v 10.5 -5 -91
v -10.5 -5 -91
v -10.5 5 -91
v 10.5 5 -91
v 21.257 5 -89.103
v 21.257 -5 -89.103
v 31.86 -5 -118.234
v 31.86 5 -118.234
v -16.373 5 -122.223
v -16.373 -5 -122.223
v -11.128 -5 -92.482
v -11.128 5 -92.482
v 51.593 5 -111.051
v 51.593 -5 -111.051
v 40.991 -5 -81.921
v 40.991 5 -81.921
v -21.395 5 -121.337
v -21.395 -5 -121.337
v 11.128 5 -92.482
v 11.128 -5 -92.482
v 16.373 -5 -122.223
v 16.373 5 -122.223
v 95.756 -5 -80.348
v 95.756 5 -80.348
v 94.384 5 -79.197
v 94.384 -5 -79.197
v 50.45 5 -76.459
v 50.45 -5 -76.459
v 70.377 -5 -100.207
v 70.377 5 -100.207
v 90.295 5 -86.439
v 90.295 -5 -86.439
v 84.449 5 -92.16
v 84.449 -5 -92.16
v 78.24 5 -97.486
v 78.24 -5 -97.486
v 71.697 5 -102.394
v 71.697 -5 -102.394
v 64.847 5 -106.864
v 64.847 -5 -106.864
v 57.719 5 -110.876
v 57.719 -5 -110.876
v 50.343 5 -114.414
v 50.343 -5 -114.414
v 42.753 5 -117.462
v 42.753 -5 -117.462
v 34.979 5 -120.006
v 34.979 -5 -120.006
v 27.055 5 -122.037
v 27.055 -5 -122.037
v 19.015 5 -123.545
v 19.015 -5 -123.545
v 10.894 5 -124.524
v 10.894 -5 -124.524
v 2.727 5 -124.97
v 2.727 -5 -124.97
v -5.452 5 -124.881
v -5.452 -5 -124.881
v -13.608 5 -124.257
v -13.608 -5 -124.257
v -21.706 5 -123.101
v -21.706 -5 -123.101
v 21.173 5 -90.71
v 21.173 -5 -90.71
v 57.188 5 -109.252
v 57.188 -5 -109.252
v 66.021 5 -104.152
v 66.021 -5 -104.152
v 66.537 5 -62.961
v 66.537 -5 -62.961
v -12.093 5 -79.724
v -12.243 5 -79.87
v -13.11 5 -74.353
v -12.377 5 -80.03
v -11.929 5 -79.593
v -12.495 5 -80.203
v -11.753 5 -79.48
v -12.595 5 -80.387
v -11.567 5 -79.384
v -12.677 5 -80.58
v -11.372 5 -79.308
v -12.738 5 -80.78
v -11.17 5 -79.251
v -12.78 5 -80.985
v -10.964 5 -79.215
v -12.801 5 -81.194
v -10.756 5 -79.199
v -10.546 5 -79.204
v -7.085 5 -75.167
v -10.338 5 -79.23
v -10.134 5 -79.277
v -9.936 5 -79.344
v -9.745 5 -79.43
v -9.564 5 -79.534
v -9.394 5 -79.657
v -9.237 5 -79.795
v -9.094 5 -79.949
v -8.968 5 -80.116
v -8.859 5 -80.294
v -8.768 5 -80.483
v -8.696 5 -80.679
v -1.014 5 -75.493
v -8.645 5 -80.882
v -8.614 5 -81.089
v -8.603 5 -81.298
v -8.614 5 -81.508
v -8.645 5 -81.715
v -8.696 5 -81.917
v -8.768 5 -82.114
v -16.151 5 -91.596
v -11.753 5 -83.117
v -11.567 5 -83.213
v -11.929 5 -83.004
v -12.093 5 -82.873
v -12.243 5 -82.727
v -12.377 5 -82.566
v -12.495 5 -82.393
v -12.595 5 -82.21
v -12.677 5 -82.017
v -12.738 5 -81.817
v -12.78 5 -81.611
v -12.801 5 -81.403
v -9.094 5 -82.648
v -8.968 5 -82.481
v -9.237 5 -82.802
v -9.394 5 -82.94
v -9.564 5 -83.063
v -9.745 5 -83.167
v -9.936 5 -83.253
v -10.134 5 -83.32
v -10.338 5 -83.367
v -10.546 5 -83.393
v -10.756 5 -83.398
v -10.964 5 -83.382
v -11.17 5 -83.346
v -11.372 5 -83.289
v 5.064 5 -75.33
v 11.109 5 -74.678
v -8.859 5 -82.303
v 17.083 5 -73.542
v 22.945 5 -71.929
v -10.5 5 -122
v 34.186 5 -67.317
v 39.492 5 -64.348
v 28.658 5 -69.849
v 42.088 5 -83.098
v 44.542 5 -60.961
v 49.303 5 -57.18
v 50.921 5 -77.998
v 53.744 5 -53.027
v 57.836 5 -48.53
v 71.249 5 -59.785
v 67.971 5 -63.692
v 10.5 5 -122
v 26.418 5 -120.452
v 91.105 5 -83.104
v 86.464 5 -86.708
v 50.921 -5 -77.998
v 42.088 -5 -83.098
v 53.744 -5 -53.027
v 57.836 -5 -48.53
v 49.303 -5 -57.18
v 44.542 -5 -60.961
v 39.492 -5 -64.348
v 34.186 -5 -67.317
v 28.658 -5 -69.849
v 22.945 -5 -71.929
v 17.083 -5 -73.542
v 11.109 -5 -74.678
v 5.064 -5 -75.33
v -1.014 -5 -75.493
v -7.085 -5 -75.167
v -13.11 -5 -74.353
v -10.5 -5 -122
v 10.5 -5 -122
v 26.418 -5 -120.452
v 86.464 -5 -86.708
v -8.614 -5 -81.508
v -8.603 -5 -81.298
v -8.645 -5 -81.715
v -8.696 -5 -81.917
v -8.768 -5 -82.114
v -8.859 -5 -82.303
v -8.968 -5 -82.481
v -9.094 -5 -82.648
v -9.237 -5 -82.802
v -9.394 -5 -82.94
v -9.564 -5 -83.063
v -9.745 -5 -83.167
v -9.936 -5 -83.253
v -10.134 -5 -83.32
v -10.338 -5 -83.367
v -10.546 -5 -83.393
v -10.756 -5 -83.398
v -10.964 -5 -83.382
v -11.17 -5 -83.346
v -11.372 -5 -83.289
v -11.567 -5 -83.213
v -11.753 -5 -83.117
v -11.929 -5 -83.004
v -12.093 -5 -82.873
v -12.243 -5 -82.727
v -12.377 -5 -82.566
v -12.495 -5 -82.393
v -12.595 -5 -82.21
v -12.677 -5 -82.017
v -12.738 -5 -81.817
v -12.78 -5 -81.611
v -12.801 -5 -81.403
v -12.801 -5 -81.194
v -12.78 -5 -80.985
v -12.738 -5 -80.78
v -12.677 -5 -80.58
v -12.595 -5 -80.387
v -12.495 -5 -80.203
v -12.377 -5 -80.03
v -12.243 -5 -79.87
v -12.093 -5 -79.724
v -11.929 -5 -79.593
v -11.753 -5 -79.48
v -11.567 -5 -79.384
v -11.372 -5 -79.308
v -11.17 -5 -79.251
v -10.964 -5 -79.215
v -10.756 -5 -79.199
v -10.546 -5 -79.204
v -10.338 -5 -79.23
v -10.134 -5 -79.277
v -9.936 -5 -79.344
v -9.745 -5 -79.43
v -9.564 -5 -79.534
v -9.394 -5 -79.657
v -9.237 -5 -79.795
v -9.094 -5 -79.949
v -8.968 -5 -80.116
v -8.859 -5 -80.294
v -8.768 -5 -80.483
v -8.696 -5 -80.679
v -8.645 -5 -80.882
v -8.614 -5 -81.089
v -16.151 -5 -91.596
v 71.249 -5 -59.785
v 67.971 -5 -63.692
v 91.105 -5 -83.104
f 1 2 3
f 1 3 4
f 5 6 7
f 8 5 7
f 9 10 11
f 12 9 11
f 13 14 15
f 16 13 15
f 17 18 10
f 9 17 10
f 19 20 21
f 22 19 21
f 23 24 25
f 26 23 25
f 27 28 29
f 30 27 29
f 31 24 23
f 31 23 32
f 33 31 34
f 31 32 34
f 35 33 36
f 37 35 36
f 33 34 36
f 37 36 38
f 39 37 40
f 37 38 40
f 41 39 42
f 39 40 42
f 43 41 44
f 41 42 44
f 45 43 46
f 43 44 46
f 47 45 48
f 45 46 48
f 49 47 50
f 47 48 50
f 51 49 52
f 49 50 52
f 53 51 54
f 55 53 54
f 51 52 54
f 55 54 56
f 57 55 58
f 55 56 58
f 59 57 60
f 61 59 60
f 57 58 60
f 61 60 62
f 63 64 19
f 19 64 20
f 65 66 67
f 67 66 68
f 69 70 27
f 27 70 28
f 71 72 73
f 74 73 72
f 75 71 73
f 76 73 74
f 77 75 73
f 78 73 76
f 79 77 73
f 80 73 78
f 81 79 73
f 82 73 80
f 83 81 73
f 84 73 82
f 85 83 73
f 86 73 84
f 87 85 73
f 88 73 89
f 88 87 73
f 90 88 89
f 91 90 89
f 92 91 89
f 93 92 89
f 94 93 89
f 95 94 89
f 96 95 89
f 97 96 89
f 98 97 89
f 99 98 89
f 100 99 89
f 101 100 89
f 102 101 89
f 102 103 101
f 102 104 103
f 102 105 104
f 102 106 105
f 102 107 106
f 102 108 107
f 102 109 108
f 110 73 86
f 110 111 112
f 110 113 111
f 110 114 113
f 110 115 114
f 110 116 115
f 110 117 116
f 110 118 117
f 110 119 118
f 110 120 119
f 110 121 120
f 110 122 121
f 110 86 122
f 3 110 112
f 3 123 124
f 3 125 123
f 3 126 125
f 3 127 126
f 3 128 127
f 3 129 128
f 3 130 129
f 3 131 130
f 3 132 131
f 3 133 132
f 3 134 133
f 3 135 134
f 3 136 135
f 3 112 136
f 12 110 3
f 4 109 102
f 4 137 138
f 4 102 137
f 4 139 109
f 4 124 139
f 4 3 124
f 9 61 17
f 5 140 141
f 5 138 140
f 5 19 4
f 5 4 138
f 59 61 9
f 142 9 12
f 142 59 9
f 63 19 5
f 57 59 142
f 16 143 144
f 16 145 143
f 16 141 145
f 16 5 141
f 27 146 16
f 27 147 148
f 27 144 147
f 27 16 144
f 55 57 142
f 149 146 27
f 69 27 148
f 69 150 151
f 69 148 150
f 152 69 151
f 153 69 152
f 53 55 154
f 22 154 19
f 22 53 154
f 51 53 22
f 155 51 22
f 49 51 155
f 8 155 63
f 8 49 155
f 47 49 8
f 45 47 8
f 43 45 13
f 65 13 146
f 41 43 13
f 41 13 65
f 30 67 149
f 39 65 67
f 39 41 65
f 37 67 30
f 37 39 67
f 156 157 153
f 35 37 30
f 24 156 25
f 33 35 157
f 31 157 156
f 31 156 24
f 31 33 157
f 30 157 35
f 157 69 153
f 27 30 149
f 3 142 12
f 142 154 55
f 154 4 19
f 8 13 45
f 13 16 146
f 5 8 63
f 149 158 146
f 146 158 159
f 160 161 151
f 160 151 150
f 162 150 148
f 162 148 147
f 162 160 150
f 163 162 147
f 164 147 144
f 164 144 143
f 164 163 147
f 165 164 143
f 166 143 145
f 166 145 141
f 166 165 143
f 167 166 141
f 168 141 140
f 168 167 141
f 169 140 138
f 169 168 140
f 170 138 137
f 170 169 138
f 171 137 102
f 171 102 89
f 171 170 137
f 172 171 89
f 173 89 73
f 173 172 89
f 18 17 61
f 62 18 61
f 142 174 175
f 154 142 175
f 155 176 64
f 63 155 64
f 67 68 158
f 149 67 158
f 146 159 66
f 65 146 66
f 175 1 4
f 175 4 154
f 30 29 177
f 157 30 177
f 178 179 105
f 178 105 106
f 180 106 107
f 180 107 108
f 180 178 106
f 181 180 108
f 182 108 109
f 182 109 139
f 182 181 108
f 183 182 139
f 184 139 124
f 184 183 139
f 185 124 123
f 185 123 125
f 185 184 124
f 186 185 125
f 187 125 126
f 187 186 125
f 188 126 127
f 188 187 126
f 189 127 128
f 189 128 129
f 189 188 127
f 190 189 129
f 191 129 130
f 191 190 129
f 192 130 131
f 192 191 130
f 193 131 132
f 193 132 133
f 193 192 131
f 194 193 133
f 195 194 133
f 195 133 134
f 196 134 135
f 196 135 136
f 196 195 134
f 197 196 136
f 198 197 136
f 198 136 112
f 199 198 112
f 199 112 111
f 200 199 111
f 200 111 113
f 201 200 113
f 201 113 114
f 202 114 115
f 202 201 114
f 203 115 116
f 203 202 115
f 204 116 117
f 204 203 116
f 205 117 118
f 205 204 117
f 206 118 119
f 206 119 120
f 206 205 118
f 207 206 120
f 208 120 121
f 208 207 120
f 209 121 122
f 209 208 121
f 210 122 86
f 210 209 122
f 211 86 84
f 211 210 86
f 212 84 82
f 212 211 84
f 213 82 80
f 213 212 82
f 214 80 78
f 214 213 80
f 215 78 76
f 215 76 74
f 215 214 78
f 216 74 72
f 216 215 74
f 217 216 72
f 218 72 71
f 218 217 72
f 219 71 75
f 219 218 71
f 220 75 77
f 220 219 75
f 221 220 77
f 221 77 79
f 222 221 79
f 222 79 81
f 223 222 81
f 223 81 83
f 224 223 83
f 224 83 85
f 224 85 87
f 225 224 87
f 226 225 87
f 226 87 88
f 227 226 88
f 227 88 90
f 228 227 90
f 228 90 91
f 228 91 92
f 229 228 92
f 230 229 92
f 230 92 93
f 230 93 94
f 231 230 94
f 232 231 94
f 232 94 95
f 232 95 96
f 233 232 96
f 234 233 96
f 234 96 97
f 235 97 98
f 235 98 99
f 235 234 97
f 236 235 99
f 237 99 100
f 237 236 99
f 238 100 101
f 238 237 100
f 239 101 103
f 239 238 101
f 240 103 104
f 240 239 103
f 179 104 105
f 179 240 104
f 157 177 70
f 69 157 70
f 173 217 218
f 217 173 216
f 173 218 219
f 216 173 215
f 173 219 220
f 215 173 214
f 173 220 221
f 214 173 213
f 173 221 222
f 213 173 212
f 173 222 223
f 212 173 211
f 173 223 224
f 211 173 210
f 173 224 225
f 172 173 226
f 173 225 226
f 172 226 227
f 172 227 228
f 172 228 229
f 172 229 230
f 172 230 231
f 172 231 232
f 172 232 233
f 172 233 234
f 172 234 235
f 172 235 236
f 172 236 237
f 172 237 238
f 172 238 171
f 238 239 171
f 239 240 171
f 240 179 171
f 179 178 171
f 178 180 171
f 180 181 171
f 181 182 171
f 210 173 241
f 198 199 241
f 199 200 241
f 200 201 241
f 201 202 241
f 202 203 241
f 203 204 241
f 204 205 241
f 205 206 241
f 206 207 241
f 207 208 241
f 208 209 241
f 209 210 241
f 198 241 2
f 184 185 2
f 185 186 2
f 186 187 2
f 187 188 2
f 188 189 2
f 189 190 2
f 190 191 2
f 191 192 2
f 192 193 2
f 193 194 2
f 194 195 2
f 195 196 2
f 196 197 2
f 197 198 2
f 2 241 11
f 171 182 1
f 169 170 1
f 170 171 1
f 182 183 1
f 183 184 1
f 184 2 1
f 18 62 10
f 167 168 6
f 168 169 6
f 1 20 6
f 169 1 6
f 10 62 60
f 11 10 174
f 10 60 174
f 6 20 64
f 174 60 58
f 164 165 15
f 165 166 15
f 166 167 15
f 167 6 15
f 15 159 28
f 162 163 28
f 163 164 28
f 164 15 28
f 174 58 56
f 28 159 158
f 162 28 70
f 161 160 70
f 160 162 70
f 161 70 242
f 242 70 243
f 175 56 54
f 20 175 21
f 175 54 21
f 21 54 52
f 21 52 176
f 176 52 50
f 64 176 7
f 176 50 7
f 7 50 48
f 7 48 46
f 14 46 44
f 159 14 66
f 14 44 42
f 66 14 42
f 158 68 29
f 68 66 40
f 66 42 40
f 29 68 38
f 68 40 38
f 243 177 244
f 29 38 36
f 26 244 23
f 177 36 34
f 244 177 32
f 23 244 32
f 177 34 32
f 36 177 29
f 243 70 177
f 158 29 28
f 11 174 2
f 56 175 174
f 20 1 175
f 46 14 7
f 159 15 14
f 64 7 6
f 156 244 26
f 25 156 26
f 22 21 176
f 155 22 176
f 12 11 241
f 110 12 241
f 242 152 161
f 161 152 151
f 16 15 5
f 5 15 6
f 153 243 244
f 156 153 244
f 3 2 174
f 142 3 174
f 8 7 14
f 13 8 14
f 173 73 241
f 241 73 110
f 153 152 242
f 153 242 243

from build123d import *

# Parameters (mm, degrees)
BOSS_EXTRUDE1_START       = -5
BOSS_EXTRUDE1_OUTLINE_R   = 125
BOSS_EXTRUDE1_OUTLINE_R_2 = 2.1
BOSS_EXTRUDE1_OUTLINE_W   = 21
BOSS_EXTRUDE1_OUTLINE_H   = 31
BOSS_EXTRUDE1_OUTLINE_W_2 = 30.2
BOSS_EXTRUDE1_OUTLINE_H_2 = 10.2
BOSS_EXTRUDE1_OUTLINE_R_3 = 75.5
BOSS_EXTRUDE1_DEPTH       = 10
SKETCH4_OUTSIDE_W         = 322.738
SKETCH4_OUTSIDE_H         = 322.738
CUT_EXTRUDE1_DEPTH        = 10


# Read off the part's stored shape, not the designer's step: Boss-Extrude1
with BuildPart() as part:
    # Boss-Extrude1 outline → Boss-Extrude1 (new body)
    with BuildSketch(Plane(origin=(0, 0, 0), x_dir=(1, 0, 0), z_dir=(0, 1, 0)).offset(BOSS_EXTRUDE1_START)):
        Circle(BOSS_EXTRUDE1_OUTLINE_R)
        Polygon((-86.463555034, -86.708152159), (-66.537139134, -62.960774422), (-50.450205829, -76.459314226), (-70.376621729, -100.206691962), align=None, mode=Mode.SUBTRACT)
        Polygon((-91.105361481, -83.104052392), (-97.661795099, -75.290399072), (-74.527252917, -55.87821326), (-67.970819298, -63.69186658), align=None, mode=Mode.SUBTRACT)
        Polygon((-51.593230004, -111.051288231), (-40.990605561, -81.920816987), (-21.257060524, -89.103239996), (-31.859684967, -118.233711241), align=None, mode=Mode.SUBTRACT)
        Polygon((-16.372500708, -122.222795071), (-26.417539789, -120.451583659), (-21.173364823, -90.710389518), (-11.128325743, -92.48160093), align=None, mode=Mode.SUBTRACT)
        Polygon((-57.187775987, -109.252133582), (-66.021235106, -104.152133582), (-50.921235106, -77.998166387), (-42.087775987, -83.098166387), align=None, mode=Mode.SUBTRACT)
        Polygon((-114.034295807, -46.932395999), (-117.522901269, -37.347531267), (-89.144184122, -27.018522939), (-85.65557866, -36.603387671), align=None, mode=Mode.SUBTRACT)
        Polygon((-110.905099262, -51.90673326), (-84.058311744, -36.40673326), (-73.558311744, -54.59326674), (-100.405099262, -70.09326674), align=None, mode=Mode.SUBTRACT)
        Polygon((-121.969851733, -10.844596269), (-91.44081139, -5.461502761), (-87.794199659, -26.142465574), (-118.323240002, -31.525559082), align=None, mode=Mode.SUBTRACT)
        with Locations((-81.298478633, -10.703147762)):
            Circle(BOSS_EXTRUDE1_OUTLINE_R_2, mode=Mode.SUBTRACT)
        with Locations((0, -106.5)):
            Rectangle(BOSS_EXTRUDE1_OUTLINE_W, BOSS_EXTRUDE1_OUTLINE_H, mode=Mode.SUBTRACT)
        Polygon((26.417539789, -120.451583659), (16.372500708, -122.222795071), (11.128325743, -92.48160093), (21.173364823, -90.710389518), align=None, mode=Mode.SUBTRACT)
        Polygon((31.859684968, -118.233711241), (21.257060524, -89.103239996), (40.990605561, -81.920816987), (51.593230004, -111.051288231), align=None, mode=Mode.SUBTRACT)
        with Locations((10.703147762, -81.298478633)):
            Circle(BOSS_EXTRUDE1_OUTLINE_R_2, mode=Mode.SUBTRACT)
        Polygon((66.021235106, -104.152133582), (57.187775987, -109.252133582), (42.087775987, -83.098166387), (50.921235106, -77.998166387), align=None, mode=Mode.SUBTRACT)
        Polygon((70.376621729, -100.206691962), (50.450205829, -76.459314226), (66.537139134, -62.960774422), (86.463555035, -86.708152159), align=None, mode=Mode.SUBTRACT)
        Polygon((97.661795099, -75.290399072), (91.105361481, -83.104052392), (67.970819298, -63.69186658), (74.527252917, -55.87821326), align=None, mode=Mode.SUBTRACT)
        Polygon((100.405099262, -70.09326674), (73.558311744, -54.59326674), (84.058311744, -36.40673326), (110.905099262, -51.90673326), align=None, mode=Mode.SUBTRACT)
        Polygon((117.522901269, -37.347531267), (114.034295807, -46.932395999), (85.65557866, -36.603387671), (89.144184122, -27.018522939), align=None, mode=Mode.SUBTRACT)
        Polygon((118.323240002, -31.525559082), (87.794199659, -26.142465574), (91.44081139, -5.461502761), (121.969851733, -10.844596269), align=None, mode=Mode.SUBTRACT)
        with Locations((-108.109011093, 0)):
            Rectangle(BOSS_EXTRUDE1_OUTLINE_W_2, BOSS_EXTRUDE1_OUTLINE_H_2, mode=Mode.SUBTRACT)
        Polygon((-118.323240002, 31.525559082), (-87.794199659, 26.142465574), (-91.44081139, 5.461502761), (-121.969851733, 10.844596269), align=None, mode=Mode.SUBTRACT)
        Polygon((-117.522901269, 37.347531267), (-114.034295807, 46.932395999), (-85.65557866, 36.603387671), (-89.144184122, 27.018522939), align=None, mode=Mode.SUBTRACT)
        Polygon((-100.405099262, 70.09326674), (-73.558311744, 54.59326674), (-84.058311744, 36.40673326), (-110.905099262, 51.90673326), align=None, mode=Mode.SUBTRACT)
        Polygon((-97.661795099, 75.290399072), (-91.105361481, 83.104052392), (-67.970819298, 63.69186658), (-74.527252917, 55.87821326), align=None, mode=Mode.SUBTRACT)
        Polygon((-70.376621729, 100.206691962), (-50.450205829, 76.459314226), (-66.537139134, 62.960774422), (-86.463555035, 86.708152159), align=None, mode=Mode.SUBTRACT)
        Polygon((-66.021235106, 104.152133582), (-57.187775987, 109.252133582), (-42.087775987, 83.098166387), (-50.921235106, 77.998166387), align=None, mode=Mode.SUBTRACT)
        with Locations((-10.703147762, 81.298478633)):
            Circle(BOSS_EXTRUDE1_OUTLINE_R_2, mode=Mode.SUBTRACT)
        Polygon((-31.859684967, 118.233711241), (-21.257060524, 89.103239996), (-40.990605561, 81.920816987), (-51.593230004, 111.051288231), align=None, mode=Mode.SUBTRACT)
        Polygon((-26.417539789, 120.451583659), (-16.372500708, 122.222795071), (-11.128325743, 92.48160093), (-21.173364823, 90.710389518), align=None, mode=Mode.SUBTRACT)
        Circle(BOSS_EXTRUDE1_OUTLINE_R_3, mode=Mode.SUBTRACT)
        with Locations((81.298478633, 10.703147762)):
            Circle(BOSS_EXTRUDE1_OUTLINE_R_2, mode=Mode.SUBTRACT)
        with Locations((108.109011093, 0)):
            Rectangle(BOSS_EXTRUDE1_OUTLINE_W_2, BOSS_EXTRUDE1_OUTLINE_H_2, mode=Mode.SUBTRACT)
        Polygon((121.969851733, 10.844596269), (91.44081139, 5.461502761), (87.794199659, 26.142465574), (118.323240002, 31.525559082), align=None, mode=Mode.SUBTRACT)
        Polygon((110.905099262, 51.90673326), (84.058311744, 36.40673326), (73.558311744, 54.59326674), (100.405099262, 70.09326674), align=None, mode=Mode.SUBTRACT)
        Polygon((114.034295807, 46.932395999), (117.522901269, 37.347531267), (89.144184122, 27.018522939), (85.65557866, 36.603387671), align=None, mode=Mode.SUBTRACT)
        Polygon((57.187775987, 109.252133582), (66.021235106, 104.152133582), (50.921235106, 77.998166387), (42.087775987, 83.098166387), align=None, mode=Mode.SUBTRACT)
        with Locations((0, 106.5)):
            Rectangle(BOSS_EXTRUDE1_OUTLINE_W, BOSS_EXTRUDE1_OUTLINE_H, mode=Mode.SUBTRACT)
        Polygon((16.372500708, 122.222795071), (26.417539789, 120.451583659), (21.173364823, 90.710389518), (11.128325743, 92.48160093), align=None, mode=Mode.SUBTRACT)
        Polygon((51.593230004, 111.051288231), (40.990605561, 81.920816987), (21.257060524, 89.103239996), (31.859684967, 118.233711241), align=None, mode=Mode.SUBTRACT)
        Polygon((91.105361481, 83.104052392), (97.661795099, 75.290399072), (74.527252917, 55.87821326), (67.970819298, 63.69186658), align=None, mode=Mode.SUBTRACT)
        Polygon((86.463555035, 86.708152159), (66.537139134, 62.960774422), (50.450205829, 76.459314226), (70.376621729, 100.206691962), align=None, mode=Mode.SUBTRACT)
    extrude(amount=BOSS_EXTRUDE1_DEPTH)

    # Sketch4 outside → Cut-Extrude1 (cut)
    with BuildSketch(Plane(origin=(0, 5, 0), x_dir=(1, 0, 0), z_dir=(0, 1, 0))):
        Rectangle(SKETCH4_OUTSIDE_W, SKETCH4_OUTSIDE_H)
        with BuildLine():
            Line((-10.697510124, 60.668594683), (-21.395020248, 121.337189365))
            Line((-21.395020248, 121.337189365), (-23.360523909, 132.484114544))
            ThreePointArc((-23.360523909, 132.484114544), (45.824573947, 126.527015659), (101.778053823, 85.401927425))
            Line((101.778053823, 85.401927425), (94.38357829, 79.197225732))
            Line((94.38357829, 79.197225732), (51.307753621, 43.05231714))
            ThreePointArc((51.307753621, 43.05231714), (21.817456639, 57.183528482), (-10.697510124, 60.668594683))
        make_face(mode=Mode.SUBTRACT)
    extrude(amount=-CUT_EXTRUDE1_DEPTH, mode=Mode.SUBTRACT)


solid = part.part
